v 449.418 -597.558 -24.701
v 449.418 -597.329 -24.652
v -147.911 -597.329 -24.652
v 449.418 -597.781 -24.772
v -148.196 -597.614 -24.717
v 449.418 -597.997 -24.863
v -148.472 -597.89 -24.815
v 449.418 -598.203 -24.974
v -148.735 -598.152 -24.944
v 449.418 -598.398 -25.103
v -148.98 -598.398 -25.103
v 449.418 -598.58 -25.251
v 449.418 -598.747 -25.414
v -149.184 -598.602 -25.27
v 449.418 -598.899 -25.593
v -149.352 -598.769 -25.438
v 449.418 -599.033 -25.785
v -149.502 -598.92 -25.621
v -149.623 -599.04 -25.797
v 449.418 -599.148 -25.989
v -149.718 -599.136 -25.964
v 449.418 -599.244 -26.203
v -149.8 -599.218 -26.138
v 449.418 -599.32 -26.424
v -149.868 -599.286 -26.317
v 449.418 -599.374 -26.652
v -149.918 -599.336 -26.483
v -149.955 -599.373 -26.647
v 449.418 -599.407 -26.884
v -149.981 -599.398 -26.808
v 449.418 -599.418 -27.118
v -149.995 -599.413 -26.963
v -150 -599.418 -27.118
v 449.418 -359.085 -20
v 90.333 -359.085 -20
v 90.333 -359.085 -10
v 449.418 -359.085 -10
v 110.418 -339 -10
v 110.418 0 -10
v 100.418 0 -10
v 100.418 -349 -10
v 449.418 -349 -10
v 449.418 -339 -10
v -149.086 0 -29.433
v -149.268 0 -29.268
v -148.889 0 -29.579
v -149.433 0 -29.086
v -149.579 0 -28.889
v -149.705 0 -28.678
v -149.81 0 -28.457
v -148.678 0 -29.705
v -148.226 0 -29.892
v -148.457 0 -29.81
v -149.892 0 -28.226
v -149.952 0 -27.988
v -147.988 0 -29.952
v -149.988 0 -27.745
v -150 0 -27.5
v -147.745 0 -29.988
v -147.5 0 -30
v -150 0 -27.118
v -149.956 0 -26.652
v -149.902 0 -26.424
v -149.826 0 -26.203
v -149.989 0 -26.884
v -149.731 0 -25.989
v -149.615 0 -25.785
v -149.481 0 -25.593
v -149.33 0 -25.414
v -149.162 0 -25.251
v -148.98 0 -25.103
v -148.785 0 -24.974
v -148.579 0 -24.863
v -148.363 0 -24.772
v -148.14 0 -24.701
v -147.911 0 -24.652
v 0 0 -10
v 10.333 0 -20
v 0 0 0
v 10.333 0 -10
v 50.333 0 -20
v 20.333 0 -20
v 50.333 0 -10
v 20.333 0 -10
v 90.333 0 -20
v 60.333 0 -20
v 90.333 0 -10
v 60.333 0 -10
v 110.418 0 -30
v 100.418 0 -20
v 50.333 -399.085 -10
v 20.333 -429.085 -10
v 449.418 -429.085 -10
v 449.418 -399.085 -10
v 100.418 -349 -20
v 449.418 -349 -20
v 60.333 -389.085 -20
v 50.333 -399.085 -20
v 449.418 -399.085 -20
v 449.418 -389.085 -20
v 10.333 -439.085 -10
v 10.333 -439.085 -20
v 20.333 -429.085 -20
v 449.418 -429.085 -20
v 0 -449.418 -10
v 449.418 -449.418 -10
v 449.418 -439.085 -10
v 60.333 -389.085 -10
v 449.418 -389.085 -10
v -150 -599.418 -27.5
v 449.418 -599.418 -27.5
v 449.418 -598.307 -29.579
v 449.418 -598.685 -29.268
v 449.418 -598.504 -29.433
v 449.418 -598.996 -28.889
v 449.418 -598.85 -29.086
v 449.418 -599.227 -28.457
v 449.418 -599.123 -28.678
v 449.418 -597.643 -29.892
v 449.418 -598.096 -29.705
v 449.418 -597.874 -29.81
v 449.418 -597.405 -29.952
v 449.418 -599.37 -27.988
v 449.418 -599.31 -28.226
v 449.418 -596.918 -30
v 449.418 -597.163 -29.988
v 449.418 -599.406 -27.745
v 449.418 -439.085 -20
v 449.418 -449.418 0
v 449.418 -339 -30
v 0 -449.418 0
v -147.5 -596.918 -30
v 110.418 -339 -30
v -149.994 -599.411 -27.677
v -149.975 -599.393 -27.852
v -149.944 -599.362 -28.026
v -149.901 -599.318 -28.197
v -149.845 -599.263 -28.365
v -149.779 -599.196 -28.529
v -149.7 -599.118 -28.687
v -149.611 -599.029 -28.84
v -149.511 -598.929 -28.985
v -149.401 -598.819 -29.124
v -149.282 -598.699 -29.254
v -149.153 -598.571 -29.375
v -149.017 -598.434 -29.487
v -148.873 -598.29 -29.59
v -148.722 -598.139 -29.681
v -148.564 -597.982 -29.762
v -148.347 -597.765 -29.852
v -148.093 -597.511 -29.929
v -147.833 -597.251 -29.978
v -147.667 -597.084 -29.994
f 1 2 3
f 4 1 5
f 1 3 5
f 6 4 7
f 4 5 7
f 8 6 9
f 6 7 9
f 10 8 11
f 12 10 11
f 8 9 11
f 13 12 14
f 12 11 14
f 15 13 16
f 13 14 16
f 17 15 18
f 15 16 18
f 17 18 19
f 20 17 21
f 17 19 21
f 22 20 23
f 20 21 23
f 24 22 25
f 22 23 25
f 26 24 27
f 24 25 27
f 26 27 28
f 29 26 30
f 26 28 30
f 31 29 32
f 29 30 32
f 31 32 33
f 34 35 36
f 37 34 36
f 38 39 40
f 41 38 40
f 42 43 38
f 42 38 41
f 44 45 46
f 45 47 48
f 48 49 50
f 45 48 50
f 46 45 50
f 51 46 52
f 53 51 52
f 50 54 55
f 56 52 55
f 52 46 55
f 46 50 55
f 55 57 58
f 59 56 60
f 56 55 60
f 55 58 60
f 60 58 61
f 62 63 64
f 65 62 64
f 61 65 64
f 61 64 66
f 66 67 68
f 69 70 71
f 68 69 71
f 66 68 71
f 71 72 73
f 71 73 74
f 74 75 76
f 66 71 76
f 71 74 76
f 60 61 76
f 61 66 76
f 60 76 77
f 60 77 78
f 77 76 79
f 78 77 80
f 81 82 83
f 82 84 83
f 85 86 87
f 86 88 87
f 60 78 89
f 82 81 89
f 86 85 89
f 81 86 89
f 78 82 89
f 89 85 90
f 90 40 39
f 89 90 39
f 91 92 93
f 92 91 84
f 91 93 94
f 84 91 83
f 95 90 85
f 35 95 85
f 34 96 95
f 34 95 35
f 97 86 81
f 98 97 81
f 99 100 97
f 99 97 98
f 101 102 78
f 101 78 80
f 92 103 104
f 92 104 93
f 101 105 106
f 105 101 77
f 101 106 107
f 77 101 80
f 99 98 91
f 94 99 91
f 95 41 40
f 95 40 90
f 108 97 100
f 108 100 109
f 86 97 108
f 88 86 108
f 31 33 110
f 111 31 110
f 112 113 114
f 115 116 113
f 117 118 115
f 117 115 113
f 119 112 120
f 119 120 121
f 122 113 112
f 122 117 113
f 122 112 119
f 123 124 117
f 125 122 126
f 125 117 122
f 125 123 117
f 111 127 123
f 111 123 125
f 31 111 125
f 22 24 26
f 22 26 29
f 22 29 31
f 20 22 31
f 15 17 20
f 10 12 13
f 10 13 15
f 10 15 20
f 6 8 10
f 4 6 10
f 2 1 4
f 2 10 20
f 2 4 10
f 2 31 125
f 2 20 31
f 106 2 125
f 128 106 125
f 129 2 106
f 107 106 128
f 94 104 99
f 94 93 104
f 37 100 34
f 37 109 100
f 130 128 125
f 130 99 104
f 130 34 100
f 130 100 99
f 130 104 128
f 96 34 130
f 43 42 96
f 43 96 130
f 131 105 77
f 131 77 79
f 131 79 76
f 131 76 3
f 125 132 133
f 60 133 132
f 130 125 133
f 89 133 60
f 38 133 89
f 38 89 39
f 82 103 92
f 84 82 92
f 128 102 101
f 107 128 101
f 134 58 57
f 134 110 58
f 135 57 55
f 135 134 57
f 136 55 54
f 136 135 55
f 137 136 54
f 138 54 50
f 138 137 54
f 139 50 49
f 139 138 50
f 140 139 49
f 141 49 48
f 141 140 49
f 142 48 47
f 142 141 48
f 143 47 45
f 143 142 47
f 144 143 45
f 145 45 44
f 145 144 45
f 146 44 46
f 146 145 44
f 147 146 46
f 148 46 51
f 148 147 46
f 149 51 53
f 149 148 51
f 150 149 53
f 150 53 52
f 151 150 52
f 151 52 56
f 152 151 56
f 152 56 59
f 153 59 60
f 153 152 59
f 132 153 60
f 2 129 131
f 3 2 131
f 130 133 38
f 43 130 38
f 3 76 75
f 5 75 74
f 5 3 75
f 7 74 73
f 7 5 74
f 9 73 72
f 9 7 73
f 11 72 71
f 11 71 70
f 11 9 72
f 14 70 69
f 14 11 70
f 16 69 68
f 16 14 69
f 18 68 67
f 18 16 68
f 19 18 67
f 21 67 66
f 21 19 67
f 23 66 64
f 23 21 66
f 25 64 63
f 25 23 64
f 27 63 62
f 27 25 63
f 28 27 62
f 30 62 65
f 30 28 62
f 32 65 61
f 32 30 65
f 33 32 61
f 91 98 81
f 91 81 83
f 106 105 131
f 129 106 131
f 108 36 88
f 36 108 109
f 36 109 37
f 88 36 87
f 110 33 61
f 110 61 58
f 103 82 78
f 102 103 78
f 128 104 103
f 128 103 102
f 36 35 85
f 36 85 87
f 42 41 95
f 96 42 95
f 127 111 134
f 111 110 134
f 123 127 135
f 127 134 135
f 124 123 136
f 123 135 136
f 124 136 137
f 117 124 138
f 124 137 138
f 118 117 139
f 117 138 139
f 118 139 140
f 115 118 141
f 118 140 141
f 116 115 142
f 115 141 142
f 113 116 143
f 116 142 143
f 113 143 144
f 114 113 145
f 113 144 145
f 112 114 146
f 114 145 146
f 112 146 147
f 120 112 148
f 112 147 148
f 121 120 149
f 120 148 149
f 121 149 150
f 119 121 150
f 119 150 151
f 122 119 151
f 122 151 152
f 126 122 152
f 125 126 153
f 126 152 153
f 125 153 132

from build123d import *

# Parameters (mm, degrees)
F0_W        = 30
F0_H        = 10
F0_W_2      = 10.3326633751
F1_DEPTH    = 600
F2_T1_DEPTH = 1362.4185197182
F3_SIZE2    = 149.99999
F3_SIZE     = 24.99999
F4_R        = 2.5


# Not quite as in the source:
# - a fillet or chamfer that OpenCascade refuses, or shapes differently, is made with other operations: its cross-section is extruded or revolved along the edge and cut away or added
# - a fillet or chamfer is up to 0.001 mm smaller than in the source, because OpenCascade refuses the exact size


with BuildPart() as f1:
    # F0 (on Front) → F1 (new body)
    with BuildSketch(Plane.XZ):
        Polygon((0, -10), (0, 0), (-150, 0), (-150, -30), (0, -30), (0, -20), align=None)
        with Locations((75.3326633751, -15)):
            Rectangle(F0_W, F0_H)
        with Locations((5.1663316875, -15)):
            Rectangle(F0_W_2, F0_H)
        with Locations((35.3326633751, -15)):
            Rectangle(F0_W, F0_H)
        Polygon((10.3326633751, -20), (0, -20), (0, -30), (100.4177228767, -30), (100.4177228767, -20), (90.3326633751, -20), (60.3326633751, -20), (50.3326633751, -20), (20.3326633751, -20), align=None)
        Polygon((100.4177228767, -20), (100.4177228767, -30), (110.4177228767, -30), (110.4177228767, -10), (100.4177228767, -10), align=None)
    extrude(amount=F1_DEPTH)

    # F2: chamfer of 261 on 1 edges, made by hand

    # F2_s2 → F2_t1 (cut)
    with BuildSketch(Plane.XY.offset(-701.2092598591)):
        Polygon((110.4177228767, -339), (-150.5822771233, -600), (110.4177228767, -600), align=None)
    extrude(amount=F2_T1_DEPTH, mode=Mode.SUBTRACT)

    # F3 (size 25 and 150 in the source; OpenCascade refuses exactly that, so slightly less here)
    f3_edges = [f1.edges().sort_by_distance(p)[0] for p in [
        (-150, -299.708861, 0),
    ]]
    f3_side = f1.faces().sort_by_distance((-150, -299.708861, -15))[0]
    chamfer(f3_edges, length=F3_SIZE, length2=F3_SIZE2, reference=f3_side)

    # F4
    f4_edges = [f1.edges().sort_by_distance(p)[0] for p in [
        (-150, -299.708861, -24.99999),
        (-150, -299.708861, -30),
    ]]
    fillet(f4_edges, radius=F4_R)

    # F5: F1 across face


with BuildPart() as f1_1:
    add(f1.part)
    add(f1.part.mirror(Plane(origin=(-9.807206416, -459.2249292927, -20.1902158269), x_dir=(0.7071067812, 0.7071067812, 0), z_dir=(0.7071067812, -0.7071067812, 0))))


solid = f1_1.part
